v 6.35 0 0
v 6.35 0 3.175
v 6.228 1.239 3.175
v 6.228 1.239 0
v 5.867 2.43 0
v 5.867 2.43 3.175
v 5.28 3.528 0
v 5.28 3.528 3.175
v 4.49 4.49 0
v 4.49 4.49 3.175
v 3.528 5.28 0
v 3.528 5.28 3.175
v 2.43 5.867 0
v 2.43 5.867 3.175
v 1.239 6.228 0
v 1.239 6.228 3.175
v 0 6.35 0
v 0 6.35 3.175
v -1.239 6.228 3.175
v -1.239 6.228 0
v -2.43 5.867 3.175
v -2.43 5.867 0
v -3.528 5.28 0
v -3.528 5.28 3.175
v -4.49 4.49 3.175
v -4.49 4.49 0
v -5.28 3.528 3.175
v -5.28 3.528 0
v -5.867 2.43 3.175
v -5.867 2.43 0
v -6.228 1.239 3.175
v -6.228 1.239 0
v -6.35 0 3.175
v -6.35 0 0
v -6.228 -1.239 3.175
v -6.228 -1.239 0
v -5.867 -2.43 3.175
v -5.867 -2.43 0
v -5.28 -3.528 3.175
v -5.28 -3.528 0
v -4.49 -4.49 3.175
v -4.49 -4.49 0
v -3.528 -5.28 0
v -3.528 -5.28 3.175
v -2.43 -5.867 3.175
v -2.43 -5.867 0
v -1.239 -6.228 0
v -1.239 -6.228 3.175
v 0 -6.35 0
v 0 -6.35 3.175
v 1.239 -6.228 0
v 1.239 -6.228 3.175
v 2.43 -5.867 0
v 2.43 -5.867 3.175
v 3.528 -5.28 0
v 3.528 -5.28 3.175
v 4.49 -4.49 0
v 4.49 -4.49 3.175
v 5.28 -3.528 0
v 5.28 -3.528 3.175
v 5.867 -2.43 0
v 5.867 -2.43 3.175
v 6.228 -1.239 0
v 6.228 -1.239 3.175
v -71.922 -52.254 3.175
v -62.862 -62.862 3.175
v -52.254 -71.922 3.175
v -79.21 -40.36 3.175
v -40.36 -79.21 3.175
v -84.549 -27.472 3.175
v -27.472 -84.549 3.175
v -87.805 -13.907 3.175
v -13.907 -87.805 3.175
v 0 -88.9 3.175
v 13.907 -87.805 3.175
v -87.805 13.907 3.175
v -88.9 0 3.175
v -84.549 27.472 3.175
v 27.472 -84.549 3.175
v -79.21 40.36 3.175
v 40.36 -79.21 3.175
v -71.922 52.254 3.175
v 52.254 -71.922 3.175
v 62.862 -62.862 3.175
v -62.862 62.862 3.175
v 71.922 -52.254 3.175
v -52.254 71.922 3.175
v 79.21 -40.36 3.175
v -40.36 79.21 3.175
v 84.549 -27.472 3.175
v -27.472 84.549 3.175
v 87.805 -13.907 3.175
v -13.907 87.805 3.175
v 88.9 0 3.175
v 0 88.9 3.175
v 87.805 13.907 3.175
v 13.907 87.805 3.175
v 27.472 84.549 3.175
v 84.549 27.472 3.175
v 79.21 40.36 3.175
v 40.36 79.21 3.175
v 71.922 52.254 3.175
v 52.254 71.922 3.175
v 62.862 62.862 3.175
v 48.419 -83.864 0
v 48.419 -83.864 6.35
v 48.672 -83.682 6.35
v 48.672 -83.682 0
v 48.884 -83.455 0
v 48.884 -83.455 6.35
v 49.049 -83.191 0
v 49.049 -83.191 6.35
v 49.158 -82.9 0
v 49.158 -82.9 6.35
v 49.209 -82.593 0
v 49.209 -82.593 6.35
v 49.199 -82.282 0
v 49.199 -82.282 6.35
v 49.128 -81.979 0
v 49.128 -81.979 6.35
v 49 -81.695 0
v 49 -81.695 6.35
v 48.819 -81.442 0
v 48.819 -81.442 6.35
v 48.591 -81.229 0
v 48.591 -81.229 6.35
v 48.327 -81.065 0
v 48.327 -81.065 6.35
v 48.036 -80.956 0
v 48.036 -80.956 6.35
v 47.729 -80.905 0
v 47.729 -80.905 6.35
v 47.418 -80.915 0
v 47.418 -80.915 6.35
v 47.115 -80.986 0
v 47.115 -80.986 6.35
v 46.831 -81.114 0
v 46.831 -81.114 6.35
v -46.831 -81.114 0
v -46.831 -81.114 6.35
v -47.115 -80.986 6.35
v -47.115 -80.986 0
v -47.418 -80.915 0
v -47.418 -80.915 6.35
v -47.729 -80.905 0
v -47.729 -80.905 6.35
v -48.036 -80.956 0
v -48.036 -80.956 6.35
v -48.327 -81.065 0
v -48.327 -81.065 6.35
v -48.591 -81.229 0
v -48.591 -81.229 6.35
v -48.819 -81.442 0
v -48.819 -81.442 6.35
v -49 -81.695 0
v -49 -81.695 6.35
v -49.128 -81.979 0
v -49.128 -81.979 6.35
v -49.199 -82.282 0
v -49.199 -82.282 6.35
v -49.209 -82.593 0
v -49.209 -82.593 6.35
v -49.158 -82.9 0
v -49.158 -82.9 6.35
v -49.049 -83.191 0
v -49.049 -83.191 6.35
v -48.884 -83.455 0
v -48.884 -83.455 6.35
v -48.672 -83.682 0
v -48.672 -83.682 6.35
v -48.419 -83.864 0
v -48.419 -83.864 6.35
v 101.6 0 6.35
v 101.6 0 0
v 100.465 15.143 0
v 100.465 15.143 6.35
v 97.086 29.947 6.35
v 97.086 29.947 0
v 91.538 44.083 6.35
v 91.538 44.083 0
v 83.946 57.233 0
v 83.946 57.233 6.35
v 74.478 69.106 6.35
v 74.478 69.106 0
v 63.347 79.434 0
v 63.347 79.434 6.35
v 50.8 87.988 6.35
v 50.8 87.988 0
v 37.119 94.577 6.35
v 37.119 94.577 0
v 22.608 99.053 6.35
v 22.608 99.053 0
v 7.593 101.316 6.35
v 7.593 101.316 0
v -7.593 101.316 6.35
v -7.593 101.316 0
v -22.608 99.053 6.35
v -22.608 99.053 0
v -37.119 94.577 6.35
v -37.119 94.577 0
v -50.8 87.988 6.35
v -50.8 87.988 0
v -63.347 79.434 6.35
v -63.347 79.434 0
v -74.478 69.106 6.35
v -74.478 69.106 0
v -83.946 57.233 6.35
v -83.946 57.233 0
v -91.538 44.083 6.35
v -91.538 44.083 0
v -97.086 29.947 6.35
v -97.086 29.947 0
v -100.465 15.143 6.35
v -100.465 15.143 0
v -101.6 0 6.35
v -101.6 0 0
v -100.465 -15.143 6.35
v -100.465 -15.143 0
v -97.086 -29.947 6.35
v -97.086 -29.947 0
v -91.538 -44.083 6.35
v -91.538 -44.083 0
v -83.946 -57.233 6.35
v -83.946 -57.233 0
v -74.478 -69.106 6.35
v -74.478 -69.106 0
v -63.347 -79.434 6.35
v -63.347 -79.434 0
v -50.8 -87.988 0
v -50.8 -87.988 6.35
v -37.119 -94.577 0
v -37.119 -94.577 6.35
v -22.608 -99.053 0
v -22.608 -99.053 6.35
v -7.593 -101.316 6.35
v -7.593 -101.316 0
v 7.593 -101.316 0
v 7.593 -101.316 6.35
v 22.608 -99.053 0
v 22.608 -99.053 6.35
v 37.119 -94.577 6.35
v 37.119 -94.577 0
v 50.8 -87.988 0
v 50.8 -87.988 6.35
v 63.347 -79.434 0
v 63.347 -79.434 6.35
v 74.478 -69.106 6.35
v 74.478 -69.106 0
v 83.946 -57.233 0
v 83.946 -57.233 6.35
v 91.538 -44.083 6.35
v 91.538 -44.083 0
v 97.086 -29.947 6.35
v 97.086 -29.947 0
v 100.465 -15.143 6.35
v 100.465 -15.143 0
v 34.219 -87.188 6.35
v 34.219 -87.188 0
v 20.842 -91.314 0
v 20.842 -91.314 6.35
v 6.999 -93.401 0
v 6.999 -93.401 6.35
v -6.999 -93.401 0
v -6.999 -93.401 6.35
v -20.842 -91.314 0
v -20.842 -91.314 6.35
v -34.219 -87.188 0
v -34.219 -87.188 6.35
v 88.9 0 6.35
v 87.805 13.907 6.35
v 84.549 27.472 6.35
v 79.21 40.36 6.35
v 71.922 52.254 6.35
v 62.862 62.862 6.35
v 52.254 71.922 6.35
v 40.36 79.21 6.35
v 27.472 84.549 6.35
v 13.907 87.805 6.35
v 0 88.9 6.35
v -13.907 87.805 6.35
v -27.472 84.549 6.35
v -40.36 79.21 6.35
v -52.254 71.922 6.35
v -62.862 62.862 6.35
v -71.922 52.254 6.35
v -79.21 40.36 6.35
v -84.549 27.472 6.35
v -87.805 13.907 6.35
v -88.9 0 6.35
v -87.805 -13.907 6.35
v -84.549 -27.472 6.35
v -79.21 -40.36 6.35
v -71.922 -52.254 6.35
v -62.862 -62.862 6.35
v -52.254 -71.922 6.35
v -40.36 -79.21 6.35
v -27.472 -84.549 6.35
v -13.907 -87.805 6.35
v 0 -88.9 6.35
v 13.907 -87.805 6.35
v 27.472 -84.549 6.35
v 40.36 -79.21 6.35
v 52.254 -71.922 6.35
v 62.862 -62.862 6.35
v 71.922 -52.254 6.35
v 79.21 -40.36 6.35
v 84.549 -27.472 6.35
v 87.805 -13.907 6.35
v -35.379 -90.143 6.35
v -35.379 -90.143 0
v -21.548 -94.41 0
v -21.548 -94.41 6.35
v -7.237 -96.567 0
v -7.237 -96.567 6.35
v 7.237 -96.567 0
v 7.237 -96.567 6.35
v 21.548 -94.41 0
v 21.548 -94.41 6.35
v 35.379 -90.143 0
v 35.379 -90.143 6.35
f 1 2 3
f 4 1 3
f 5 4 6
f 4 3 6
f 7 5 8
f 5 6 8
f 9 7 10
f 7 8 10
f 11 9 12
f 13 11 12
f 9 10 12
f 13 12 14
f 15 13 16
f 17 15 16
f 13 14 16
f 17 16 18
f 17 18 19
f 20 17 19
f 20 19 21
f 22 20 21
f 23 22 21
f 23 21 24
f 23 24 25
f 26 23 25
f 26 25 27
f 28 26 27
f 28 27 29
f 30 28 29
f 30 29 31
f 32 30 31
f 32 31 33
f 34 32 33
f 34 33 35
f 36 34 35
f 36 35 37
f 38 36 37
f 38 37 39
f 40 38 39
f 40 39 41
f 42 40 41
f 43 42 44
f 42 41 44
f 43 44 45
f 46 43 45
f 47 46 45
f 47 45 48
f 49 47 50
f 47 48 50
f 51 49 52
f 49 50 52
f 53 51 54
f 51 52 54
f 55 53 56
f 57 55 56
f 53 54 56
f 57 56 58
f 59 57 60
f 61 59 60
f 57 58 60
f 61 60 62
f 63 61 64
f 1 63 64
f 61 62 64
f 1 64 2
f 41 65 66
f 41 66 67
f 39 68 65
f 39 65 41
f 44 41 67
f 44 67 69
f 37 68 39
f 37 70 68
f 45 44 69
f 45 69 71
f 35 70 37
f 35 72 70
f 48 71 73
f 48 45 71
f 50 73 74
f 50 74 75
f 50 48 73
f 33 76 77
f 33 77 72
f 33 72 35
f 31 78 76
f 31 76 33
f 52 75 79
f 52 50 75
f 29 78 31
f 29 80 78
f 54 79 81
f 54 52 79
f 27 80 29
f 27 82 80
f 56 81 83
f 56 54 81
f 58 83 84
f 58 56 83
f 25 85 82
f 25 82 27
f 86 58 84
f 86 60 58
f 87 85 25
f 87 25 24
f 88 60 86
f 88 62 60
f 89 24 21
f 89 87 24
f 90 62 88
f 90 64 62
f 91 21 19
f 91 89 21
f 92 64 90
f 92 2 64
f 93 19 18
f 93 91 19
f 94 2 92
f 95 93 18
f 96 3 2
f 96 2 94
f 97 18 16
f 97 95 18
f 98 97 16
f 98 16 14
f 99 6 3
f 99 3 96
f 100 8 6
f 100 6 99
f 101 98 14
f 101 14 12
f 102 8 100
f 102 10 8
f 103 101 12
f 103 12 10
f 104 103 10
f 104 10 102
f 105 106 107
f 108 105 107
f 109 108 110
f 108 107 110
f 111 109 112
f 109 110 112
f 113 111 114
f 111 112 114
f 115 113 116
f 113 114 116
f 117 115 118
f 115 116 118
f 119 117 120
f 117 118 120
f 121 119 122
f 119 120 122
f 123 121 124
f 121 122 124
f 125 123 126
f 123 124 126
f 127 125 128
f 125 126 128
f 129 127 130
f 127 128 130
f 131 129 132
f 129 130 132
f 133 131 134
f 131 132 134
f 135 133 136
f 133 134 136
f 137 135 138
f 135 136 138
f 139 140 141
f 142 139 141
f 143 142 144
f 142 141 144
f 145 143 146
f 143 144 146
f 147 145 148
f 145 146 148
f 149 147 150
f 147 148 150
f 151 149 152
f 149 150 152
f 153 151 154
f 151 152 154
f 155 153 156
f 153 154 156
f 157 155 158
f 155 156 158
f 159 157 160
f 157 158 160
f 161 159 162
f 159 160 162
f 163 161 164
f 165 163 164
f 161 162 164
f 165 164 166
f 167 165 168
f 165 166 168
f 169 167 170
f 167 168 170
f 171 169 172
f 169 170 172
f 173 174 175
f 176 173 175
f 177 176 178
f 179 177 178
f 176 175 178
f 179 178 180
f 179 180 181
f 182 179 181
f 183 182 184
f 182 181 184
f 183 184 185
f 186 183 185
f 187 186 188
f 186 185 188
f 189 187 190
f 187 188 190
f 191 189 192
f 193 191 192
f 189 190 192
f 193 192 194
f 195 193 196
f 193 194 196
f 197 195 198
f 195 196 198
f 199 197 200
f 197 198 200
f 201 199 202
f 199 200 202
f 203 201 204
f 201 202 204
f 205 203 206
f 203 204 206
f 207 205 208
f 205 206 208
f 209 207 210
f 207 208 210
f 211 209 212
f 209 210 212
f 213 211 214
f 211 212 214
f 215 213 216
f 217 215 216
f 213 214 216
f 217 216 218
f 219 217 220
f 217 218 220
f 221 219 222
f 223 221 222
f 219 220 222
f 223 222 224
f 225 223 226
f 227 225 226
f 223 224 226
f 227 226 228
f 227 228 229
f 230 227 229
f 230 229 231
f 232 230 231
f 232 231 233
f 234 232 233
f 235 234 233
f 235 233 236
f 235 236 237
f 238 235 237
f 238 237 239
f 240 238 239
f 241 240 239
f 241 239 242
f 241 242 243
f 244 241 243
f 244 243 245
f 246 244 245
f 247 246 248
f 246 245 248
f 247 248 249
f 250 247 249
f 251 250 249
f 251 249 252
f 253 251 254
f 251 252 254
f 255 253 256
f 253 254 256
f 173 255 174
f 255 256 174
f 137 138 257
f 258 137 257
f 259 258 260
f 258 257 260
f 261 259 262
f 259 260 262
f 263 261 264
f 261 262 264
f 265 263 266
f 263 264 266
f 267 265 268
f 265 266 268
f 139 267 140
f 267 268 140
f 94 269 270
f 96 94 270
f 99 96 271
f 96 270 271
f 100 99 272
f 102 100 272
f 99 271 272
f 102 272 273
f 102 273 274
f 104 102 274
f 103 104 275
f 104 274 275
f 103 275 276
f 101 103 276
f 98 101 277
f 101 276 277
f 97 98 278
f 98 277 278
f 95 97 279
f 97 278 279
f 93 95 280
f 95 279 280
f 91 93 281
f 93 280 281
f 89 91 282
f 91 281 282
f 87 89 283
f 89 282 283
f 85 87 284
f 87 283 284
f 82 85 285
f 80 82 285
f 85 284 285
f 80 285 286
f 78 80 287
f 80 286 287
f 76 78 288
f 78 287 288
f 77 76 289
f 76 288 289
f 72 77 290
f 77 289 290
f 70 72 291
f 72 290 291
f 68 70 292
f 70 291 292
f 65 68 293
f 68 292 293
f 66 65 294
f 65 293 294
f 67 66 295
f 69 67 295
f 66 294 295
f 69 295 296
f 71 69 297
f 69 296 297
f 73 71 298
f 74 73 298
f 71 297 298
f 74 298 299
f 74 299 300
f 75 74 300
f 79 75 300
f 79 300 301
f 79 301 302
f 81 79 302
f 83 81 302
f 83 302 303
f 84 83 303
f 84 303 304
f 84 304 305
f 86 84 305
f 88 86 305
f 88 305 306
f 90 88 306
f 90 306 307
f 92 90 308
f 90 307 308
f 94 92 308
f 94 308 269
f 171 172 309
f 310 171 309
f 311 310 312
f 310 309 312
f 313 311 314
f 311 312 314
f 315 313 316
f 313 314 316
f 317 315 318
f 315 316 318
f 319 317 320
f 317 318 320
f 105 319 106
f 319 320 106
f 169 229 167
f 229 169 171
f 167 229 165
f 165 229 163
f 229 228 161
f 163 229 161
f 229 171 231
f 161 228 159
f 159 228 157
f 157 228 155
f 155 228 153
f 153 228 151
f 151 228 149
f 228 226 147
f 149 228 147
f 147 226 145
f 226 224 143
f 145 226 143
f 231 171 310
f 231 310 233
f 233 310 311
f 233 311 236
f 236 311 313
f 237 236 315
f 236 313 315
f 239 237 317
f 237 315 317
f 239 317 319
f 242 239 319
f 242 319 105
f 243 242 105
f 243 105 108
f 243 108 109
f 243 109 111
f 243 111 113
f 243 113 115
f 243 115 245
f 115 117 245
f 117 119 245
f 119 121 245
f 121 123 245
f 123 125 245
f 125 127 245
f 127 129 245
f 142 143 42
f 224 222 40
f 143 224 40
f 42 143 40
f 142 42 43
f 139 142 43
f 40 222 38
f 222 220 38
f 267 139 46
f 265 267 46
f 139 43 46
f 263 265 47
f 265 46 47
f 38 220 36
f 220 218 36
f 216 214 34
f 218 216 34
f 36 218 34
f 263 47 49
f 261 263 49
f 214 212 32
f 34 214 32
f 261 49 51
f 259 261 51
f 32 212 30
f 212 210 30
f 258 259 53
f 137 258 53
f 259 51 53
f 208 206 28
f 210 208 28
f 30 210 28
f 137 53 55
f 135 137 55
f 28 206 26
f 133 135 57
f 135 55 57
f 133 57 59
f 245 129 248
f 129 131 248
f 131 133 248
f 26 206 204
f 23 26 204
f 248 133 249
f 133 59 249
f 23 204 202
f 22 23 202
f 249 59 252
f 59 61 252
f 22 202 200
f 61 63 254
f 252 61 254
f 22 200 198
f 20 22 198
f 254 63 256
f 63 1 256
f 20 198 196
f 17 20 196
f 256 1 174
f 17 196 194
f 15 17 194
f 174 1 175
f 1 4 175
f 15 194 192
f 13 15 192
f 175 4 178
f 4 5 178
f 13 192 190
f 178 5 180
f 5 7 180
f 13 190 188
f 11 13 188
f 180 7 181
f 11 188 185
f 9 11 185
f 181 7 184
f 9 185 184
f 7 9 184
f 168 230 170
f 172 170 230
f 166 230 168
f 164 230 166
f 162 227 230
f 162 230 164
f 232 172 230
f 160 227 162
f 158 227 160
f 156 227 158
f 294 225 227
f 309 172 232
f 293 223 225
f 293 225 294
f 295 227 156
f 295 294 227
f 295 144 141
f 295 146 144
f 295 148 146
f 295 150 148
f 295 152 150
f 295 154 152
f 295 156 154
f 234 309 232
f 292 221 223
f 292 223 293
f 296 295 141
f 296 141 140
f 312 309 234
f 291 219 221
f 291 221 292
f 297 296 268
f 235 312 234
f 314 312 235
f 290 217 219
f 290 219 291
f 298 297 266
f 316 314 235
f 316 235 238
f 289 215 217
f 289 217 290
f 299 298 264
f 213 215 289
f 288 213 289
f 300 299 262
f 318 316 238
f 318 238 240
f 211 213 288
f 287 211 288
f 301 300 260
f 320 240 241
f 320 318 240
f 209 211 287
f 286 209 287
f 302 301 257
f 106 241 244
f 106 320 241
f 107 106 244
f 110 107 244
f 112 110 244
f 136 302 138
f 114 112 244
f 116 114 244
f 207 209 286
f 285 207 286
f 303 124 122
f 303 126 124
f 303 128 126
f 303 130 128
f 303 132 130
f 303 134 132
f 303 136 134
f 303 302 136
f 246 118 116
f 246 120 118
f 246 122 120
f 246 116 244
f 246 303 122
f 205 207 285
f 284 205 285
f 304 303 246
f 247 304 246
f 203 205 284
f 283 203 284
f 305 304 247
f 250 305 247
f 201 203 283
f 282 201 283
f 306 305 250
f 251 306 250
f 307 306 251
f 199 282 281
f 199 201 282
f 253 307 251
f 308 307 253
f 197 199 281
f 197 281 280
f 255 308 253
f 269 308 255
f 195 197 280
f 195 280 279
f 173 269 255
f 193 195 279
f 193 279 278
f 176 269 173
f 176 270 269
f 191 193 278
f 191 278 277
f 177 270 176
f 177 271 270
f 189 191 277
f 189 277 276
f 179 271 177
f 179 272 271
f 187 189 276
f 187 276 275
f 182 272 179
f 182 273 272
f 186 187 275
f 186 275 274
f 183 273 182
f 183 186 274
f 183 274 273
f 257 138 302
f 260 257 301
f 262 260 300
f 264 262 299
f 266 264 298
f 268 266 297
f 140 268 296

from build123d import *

# Parameters (mm, degrees)
SKETCH1_R      = 101.6
RADIUS_DEPTH   = 6.35
SKETCH4_R      = 88.9
EXTRUDE4_DEPTH = 3.175
EXTRUDE5_DEPTH = 144.824345992
SKETCH14_R     = 6.35
EXTRUDE6_DEPTH = 6.35


with BuildPart() as part:
    # Sketch1 → Radius (new body)
    with BuildSketch(Plane.XY):
        Circle(SKETCH1_R)
    extrude(amount=RADIUS_DEPTH)

    # Sketch4 → Extrude4 (cut)
    with BuildSketch(Plane.XY.offset(6.35)):
        Circle(SKETCH4_R)
    extrude(amount=-EXTRUDE4_DEPTH, mode=Mode.SUBTRACT)

    # Sketch7 → Extrude5 (cut, through all)
    with BuildSketch(Plane.XY.offset(6.35)):
        with BuildLine():
            ThreePointArc((46.83125, -81.114104382), (0, -93.6625), (-46.83125, -81.114104382))
            ThreePointArc((-46.83125, -81.114104382), (-48.999815329, -81.69516971), (-48.41875, -83.863735039))
            ThreePointArc((-48.41875, -83.863735039), (0, -96.8375), (48.41875, -83.863735039))
            ThreePointArc((48.41875, -83.863735039), (48.999815329, -81.69516971), (46.83125, -81.114104382))
        make_face()
    extrude(amount=-EXTRUDE5_DEPTH, mode=Mode.SUBTRACT)

    # Sketch14 → Extrude6 (cut)
    with BuildSketch(Plane.XY.offset(3.175)):
        Circle(SKETCH14_R)
    extrude(amount=-EXTRUDE6_DEPTH, mode=Mode.SUBTRACT)


solid = part.part
